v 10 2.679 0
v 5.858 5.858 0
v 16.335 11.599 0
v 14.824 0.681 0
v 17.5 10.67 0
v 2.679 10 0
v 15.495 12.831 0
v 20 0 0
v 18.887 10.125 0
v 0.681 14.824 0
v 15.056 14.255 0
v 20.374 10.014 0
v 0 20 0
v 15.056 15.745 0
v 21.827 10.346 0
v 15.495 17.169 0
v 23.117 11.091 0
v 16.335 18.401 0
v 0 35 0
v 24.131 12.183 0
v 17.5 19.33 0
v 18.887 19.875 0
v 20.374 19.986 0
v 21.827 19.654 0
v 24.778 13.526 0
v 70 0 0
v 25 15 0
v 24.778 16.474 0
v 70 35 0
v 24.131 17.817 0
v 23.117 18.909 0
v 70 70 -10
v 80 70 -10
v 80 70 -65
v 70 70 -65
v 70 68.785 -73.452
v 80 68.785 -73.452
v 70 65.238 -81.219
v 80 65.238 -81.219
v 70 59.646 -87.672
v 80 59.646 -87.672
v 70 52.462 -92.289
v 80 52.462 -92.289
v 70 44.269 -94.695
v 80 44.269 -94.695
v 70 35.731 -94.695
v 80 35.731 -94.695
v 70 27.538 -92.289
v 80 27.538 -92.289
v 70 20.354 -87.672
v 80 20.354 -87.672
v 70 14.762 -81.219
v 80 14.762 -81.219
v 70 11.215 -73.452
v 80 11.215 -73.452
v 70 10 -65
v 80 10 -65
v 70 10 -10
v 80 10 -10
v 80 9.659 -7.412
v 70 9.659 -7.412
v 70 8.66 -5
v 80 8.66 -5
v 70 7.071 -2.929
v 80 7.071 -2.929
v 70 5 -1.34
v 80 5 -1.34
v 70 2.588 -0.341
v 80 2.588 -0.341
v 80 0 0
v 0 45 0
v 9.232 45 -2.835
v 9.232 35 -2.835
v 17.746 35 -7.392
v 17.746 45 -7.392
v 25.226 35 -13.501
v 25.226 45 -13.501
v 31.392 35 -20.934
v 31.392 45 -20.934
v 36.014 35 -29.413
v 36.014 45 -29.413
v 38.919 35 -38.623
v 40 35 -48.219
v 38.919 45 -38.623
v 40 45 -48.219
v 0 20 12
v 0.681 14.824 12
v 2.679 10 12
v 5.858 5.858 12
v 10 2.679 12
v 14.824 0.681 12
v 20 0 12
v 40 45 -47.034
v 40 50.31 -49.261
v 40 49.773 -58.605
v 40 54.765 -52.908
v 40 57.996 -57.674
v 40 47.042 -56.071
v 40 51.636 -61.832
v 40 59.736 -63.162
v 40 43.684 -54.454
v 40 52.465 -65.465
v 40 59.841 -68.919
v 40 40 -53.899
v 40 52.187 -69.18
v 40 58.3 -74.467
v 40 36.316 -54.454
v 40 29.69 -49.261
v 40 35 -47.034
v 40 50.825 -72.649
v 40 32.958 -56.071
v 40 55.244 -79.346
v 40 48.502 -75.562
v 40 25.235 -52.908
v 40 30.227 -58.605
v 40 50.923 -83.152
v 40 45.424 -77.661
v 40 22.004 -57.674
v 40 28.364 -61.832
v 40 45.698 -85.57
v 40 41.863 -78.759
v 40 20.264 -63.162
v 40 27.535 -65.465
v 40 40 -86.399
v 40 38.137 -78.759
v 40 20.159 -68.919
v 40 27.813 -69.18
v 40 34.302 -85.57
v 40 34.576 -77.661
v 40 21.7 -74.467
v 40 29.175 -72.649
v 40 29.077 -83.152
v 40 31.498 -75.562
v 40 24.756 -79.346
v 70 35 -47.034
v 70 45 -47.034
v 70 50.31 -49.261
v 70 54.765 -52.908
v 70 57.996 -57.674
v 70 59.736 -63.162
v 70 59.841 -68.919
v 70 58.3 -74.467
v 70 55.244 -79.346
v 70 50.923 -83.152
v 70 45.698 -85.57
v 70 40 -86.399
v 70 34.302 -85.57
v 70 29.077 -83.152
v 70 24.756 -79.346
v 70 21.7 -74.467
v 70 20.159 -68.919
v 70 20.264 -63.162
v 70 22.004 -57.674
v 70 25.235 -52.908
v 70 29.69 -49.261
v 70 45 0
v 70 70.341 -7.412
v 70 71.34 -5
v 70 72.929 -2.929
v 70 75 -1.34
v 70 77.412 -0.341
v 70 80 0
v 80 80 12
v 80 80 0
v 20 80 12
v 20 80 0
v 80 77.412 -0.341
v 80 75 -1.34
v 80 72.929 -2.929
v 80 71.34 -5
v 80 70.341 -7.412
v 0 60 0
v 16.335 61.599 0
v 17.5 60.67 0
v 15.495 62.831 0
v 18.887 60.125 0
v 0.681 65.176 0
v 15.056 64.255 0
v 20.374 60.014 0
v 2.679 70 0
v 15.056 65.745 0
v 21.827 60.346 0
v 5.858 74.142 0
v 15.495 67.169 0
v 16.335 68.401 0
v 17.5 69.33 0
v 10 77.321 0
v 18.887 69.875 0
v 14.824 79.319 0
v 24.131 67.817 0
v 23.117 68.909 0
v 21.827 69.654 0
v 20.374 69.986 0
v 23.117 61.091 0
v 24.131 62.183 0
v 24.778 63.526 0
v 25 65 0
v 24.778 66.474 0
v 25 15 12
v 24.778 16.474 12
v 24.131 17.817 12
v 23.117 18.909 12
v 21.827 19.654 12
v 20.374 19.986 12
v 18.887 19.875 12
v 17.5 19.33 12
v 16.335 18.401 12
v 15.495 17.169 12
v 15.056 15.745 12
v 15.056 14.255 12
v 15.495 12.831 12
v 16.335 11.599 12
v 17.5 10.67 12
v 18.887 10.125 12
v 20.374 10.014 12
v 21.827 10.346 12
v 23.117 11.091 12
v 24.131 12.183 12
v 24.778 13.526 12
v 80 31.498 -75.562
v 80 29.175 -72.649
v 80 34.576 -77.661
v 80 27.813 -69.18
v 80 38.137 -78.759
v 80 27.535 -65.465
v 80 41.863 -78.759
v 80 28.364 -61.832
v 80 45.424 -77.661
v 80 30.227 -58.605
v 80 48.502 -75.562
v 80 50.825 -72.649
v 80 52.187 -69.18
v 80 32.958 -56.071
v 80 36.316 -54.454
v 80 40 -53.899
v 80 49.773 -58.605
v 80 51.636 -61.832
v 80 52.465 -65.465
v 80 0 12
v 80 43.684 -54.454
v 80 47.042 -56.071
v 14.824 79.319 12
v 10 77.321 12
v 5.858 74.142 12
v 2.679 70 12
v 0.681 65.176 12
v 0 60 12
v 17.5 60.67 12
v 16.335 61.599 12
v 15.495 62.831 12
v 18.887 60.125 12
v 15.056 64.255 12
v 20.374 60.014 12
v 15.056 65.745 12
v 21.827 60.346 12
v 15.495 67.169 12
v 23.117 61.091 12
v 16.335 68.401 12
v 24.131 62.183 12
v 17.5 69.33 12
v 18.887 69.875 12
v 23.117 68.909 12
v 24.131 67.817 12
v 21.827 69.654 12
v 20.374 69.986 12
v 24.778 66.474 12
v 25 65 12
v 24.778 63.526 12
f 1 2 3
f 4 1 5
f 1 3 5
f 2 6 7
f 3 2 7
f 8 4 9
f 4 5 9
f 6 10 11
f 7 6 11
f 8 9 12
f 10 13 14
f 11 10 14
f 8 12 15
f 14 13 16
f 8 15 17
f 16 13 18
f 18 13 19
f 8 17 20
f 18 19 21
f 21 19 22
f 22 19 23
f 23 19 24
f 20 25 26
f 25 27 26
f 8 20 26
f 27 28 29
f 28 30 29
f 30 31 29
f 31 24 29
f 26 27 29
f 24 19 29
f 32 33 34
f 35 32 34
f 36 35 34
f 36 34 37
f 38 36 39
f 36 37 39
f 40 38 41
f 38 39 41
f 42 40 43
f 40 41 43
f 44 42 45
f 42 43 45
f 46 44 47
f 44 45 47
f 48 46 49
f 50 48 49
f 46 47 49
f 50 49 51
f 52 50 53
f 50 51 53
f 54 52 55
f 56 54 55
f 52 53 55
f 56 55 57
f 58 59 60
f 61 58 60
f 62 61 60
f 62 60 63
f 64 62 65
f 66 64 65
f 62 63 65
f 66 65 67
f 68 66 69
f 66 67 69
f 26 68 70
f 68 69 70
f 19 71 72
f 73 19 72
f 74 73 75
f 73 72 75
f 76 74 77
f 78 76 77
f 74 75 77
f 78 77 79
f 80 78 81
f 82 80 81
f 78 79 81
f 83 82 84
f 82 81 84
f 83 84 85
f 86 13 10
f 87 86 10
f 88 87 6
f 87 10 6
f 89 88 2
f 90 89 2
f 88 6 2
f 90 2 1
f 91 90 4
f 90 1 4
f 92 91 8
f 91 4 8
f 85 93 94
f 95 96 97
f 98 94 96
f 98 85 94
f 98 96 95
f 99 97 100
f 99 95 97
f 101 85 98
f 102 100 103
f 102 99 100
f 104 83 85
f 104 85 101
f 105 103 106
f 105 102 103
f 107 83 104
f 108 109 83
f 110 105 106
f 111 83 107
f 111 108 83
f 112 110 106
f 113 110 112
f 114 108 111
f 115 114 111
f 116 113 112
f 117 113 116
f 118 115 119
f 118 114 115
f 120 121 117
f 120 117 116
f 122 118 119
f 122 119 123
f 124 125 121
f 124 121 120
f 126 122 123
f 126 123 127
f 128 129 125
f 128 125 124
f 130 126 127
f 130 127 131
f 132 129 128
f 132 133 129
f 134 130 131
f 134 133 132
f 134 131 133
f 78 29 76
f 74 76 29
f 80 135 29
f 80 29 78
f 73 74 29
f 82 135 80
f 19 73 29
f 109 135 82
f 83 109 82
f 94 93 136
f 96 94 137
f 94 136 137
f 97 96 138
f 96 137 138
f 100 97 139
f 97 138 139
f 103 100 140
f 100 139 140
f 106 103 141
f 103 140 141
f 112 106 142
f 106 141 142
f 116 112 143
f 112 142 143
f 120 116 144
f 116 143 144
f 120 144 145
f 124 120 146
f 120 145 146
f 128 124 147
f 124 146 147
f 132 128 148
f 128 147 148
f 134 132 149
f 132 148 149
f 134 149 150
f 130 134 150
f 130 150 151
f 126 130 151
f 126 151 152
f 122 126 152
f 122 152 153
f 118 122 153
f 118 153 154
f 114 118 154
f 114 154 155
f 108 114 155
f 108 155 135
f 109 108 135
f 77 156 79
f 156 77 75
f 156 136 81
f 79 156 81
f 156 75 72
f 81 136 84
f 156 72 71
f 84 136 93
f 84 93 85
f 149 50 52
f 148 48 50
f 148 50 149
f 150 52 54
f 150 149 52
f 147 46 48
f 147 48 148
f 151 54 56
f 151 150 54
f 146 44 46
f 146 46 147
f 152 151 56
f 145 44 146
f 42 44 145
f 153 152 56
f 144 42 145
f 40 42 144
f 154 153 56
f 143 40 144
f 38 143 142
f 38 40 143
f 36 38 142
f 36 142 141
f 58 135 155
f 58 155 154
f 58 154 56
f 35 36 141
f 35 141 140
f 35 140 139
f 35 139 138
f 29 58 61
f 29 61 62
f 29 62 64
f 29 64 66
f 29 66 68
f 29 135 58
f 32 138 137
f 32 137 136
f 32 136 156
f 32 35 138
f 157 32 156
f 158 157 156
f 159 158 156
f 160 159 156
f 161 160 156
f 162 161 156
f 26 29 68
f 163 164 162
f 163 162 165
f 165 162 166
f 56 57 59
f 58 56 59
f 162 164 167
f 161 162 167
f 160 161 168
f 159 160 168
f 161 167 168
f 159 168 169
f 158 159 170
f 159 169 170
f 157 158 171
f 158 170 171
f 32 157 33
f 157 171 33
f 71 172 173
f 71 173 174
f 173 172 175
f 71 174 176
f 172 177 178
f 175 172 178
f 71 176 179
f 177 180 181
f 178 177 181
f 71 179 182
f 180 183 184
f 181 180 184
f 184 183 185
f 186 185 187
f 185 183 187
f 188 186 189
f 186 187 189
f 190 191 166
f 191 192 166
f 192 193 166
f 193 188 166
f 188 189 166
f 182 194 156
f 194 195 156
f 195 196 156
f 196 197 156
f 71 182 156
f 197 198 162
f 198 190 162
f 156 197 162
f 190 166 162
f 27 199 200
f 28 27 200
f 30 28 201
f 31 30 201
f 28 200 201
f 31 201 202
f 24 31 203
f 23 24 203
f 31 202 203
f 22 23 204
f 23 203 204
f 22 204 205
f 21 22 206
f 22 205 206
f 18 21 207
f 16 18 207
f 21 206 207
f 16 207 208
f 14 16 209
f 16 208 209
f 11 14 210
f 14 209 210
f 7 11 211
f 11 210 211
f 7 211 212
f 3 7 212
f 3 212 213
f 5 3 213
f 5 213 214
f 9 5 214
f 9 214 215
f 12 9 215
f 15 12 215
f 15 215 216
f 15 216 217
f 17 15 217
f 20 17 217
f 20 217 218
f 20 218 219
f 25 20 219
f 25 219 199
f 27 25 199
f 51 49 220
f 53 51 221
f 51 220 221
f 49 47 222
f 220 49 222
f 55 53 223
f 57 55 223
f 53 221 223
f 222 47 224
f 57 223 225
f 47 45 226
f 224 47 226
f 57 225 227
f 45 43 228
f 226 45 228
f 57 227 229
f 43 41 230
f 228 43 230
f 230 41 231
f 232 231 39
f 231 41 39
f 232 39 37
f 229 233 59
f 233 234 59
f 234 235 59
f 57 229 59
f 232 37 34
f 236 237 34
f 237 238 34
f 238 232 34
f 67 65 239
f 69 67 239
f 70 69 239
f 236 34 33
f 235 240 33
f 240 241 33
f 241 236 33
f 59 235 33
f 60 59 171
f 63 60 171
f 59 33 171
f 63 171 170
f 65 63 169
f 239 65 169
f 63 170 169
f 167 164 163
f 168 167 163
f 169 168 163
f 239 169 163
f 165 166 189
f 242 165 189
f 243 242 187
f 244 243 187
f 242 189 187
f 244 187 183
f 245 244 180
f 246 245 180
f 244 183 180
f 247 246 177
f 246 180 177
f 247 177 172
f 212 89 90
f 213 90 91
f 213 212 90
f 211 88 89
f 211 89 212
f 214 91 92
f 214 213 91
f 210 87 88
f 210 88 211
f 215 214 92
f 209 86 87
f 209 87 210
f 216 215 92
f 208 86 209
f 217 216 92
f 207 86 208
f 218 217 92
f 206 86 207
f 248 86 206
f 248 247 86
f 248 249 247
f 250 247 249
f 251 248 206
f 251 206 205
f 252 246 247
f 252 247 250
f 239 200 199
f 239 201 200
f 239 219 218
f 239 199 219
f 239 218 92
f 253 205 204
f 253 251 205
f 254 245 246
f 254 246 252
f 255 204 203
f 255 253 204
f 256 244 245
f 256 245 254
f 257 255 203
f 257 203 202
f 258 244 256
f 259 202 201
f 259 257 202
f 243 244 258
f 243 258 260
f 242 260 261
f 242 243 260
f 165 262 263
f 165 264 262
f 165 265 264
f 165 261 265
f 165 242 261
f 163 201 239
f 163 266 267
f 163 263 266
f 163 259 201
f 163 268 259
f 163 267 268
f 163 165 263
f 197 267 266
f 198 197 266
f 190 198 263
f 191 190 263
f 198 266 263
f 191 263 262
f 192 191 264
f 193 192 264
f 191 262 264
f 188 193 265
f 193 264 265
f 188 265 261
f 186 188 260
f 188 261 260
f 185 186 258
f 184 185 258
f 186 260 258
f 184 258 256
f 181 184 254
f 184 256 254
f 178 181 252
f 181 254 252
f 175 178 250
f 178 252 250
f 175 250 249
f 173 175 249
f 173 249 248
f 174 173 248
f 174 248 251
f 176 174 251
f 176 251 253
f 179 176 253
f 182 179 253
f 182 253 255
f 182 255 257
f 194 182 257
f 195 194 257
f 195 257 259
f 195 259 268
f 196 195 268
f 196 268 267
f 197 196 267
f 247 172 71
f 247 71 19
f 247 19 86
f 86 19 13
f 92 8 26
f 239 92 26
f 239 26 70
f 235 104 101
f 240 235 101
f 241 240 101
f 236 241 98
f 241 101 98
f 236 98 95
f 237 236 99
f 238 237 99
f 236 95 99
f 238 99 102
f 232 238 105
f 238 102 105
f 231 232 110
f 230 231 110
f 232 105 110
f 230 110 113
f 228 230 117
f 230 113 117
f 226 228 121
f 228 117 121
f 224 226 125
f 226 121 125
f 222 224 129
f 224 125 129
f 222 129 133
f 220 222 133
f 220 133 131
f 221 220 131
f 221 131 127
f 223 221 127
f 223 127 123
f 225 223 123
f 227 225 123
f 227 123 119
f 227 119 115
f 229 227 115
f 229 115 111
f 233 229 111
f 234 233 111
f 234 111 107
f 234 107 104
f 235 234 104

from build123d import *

# Parameters (mm, degrees)
BOSS_EXTRUDE1_DEPTH = 12
CUT_EXTRUDE1_REACH  = 115.772
SKETCH2_R           = 5
BOSS_EXTRUDE2_DEPTH = 10
SKETCH8_R           = 20
BOSS_EXTRUDE3_DEPTH = 30
CUT_EXTRUDE2_REACH  = 132.48
SKETCH9_R           = 12.5
BOSS_EXTRUDE4_DEPTH = 5


with BuildPart() as part:
    # Sketch1 → Boss-Extrude1 (new body)
    with BuildSketch(Plane.XY):
        with BuildLine():
            Line((20, 0), (80, 0))
            Line((80, 0), (80, 80))
            Line((80, 80), (20, 80))
            ThreePointArc((20, 80), (5.857864376, 74.142135624), (0, 60))
            Line((0, 60), (0, 20))
            ThreePointArc((0, 20), (5.857864376, 5.857864376), (20, 0))
        make_face()
    extrude(amount=BOSS_EXTRUDE1_DEPTH)

    # Sketch2 → Cut-Extrude1 (cut, up to next)
    with BuildSketch(Plane.XY.offset(12), mode=Mode.PRIVATE) as cut_extrude1_sk1:
        with Locations((20, 65)):
            Circle(SKETCH2_R)
    cut_extrude1_tool1 = extrude(cut_extrude1_sk1.sketch, amount=-CUT_EXTRUDE1_REACH, mode=Mode.PRIVATE) & part.part
    # Sketch2 → Cut-Extrude1 (cut, up to next)
    with BuildSketch(Plane.XY.offset(12), mode=Mode.PRIVATE) as cut_extrude1_sk2:
        with Locations((20, 15)):
            Circle(SKETCH2_R)
    cut_extrude1_tool2 = extrude(cut_extrude1_sk2.sketch, amount=-CUT_EXTRUDE1_REACH, mode=Mode.PRIVATE) & part.part
    add(cut_extrude1_tool1.solids().sort_by_distance((20, 65, 12))[0], mode=Mode.SUBTRACT)
    add(cut_extrude1_tool2.solids().sort_by_distance((20, 15, 12))[0], mode=Mode.SUBTRACT)

    # Sketch5 → Boss-Extrude2 (add)
    with BuildSketch(Plane(origin=(80, 0, 0), x_dir=(0, 0, -1), z_dir=(1, 0, 0))):
        with BuildLine():
            Line((10, 70), (65, 70))
            ThreePointArc((65, 70), (95, 40), (65, 10))
            Line((65, 10), (10, 10))
            ThreePointArc((10, 10), (2.928932188, 7.071067812), (0, 0))
            Line((0, 0), (0, 80))
            ThreePointArc((0, 80), (2.928932188, 72.928932188), (10, 70))
        make_face()
    extrude(amount=-BOSS_EXTRUDE2_DEPTH)

    # Sketch8 → Boss-Extrude3 (add)
    with BuildSketch(Plane.ZY.offset(-70)):
        with Locations(Location((-66.398885529, 40, 0), (0, 0, 180))):
            Circle(SKETCH8_R)
    extrude(amount=BOSS_EXTRUDE3_DEPTH)

    # Sketch9 → Cut-Extrude2 (cut, up to next)
    with BuildSketch(Plane.ZY.offset(-40), mode=Mode.PRIVATE) as cut_extrude2_sk1:
        with Locations((-66.398885529, 40)):
            Circle(SKETCH9_R)
    cut_extrude2_tool1 = extrude(cut_extrude2_sk1.sketch, amount=-CUT_EXTRUDE2_REACH, mode=Mode.PRIVATE) & part.part
    add(cut_extrude2_tool1.solids().sort_by_distance((40, 40, -66.398886))[0], mode=Mode.SUBTRACT)

    # Sketch16 → Boss-Extrude4 (add, symmetric)
    with BuildSketch(Plane(origin=(0, 40, 0), x_dir=(1, 0, 0), z_dir=(0, 1, 0))):
        with BuildLine():
            Line((40, 48.219297795), (70, 48.219297795))
            Line((70, 48.219297795), (70, 0))
            Line((70, 0), (0, 0))
            ThreePointArc((0, 0), (28.488651348, 17.067944239), (40, 48.219297795))
        make_face()
    extrude(amount=BOSS_EXTRUDE4_DEPTH, both=True)


solid = part.part
